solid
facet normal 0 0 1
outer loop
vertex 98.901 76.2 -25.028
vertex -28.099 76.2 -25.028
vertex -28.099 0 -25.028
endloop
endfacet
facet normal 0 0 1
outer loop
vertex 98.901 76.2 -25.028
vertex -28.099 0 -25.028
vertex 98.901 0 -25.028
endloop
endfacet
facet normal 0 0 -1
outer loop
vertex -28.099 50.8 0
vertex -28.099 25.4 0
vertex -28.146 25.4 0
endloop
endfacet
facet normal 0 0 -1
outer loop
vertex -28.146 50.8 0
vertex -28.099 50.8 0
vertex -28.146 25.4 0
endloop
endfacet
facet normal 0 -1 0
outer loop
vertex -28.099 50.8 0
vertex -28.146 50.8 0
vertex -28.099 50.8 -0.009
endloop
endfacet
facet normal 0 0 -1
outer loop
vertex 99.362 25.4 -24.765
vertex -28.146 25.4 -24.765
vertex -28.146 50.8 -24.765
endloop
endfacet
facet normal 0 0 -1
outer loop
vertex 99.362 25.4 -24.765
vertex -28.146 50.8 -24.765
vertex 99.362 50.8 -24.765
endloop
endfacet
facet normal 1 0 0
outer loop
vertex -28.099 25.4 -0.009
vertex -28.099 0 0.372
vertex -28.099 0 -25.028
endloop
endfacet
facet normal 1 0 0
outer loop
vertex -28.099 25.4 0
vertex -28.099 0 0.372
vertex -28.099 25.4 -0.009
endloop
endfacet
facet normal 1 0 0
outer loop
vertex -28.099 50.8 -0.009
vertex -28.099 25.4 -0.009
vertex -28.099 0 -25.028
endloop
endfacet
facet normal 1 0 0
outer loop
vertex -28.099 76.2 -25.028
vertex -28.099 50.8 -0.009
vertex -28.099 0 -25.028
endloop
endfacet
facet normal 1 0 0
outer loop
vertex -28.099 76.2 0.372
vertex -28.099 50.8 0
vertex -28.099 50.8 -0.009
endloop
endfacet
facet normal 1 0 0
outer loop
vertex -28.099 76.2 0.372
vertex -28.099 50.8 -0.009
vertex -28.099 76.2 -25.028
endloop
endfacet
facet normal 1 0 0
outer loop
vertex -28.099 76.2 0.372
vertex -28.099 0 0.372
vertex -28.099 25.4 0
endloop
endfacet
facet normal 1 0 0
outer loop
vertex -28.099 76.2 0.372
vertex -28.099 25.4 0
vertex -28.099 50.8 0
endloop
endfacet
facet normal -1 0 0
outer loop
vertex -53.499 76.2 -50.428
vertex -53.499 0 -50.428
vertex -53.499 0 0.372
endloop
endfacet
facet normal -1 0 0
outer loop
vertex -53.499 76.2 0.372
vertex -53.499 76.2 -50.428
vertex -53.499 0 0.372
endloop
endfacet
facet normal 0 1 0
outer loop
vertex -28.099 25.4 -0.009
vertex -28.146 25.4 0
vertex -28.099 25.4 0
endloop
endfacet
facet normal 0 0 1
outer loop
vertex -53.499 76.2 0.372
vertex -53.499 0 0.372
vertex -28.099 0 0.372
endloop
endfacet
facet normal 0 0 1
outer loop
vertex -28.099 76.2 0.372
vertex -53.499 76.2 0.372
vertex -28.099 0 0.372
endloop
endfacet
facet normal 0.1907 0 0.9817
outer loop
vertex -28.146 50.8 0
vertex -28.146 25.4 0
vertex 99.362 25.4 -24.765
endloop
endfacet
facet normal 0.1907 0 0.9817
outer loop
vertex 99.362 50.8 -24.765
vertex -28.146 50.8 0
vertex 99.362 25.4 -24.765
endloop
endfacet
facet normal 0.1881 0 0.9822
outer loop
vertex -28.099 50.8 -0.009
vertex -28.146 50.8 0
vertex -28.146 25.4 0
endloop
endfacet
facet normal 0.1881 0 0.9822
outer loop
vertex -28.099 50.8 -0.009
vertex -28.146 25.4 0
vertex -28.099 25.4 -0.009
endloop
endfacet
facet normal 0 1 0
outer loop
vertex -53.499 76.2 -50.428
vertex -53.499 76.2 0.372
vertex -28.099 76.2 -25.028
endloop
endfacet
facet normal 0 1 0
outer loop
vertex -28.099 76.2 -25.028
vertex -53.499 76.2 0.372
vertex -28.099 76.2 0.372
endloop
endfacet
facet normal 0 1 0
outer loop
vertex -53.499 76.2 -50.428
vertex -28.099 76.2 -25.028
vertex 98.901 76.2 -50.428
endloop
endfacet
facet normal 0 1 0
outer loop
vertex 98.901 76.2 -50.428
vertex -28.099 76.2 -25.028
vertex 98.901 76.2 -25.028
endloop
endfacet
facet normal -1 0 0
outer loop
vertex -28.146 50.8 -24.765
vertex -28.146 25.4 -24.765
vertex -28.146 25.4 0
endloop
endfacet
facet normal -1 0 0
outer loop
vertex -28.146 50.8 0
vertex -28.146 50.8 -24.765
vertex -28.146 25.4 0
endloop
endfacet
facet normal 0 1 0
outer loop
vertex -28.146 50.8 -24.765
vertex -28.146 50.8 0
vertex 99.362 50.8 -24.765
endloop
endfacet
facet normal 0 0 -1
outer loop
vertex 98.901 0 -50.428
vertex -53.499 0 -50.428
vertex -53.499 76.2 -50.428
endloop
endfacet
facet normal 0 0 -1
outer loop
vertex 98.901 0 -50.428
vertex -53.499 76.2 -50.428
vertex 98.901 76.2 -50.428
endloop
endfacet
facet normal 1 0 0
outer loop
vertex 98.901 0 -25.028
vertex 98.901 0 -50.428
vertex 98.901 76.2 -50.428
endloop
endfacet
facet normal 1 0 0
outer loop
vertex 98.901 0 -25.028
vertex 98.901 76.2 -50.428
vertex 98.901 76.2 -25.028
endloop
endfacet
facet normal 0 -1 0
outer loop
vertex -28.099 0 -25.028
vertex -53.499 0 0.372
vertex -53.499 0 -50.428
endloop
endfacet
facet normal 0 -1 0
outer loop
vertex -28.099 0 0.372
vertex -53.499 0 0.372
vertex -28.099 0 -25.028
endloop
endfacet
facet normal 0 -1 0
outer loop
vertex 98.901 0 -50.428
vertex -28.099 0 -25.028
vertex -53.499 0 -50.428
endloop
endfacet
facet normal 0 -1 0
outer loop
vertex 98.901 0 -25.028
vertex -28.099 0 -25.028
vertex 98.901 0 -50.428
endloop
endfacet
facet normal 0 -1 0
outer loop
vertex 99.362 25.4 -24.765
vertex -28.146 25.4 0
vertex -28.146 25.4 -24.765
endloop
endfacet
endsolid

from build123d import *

# Parameters (mm, degrees)
F0_W     = 152.4
F0_H     = 50.8
F1_DEPTH = 76.2
F2_W     = 127
F2_H     = 76.2
F3_DEPTH = 25.4
F4_W     = 127.508001402
F4_H     = 24.7650016099
F5_DEPTH = 76.2
F6_DEPTH = 25.4
F7_DEPTH = 25.4
F9_DEPTH = 25.4


with BuildPart() as f1:
    # F0 (on Front) → F1 (new body)
    with BuildSketch(Plane.XZ):
        with Locations((22.7011106901, -25.0276401639)):
            Rectangle(F0_W, F0_H)
    extrude(amount=-F1_DEPTH)

    # F2 (on face) → F3 (cut)
    with BuildSketch(Plane.XY.offset(0.3723598361)):
        with Locations((35.4011106901, 38.1)):
            Rectangle(F2_W, F2_H)
    extrude(amount=-F3_DEPTH, mode=Mode.SUBTRACT)


with BuildPart() as f5:
    # F4 (on Front) → F5 (new body)
    with BuildSketch(Plane.XZ):
        with Locations((35.6075530872, -12.382500805)):
            Rectangle(F4_W, F4_H)
    extrude(amount=-F5_DEPTH)

    # F6 (cut): a face of the model
    f6_faces = [f5.faces().sort_by_distance(p)[0] for p in [
        (35.6075530872, 0, -12.382500805),
    ]]
    extrude(f6_faces, amount=-F6_DEPTH, mode=Mode.SUBTRACT)

    # F7 (cut): a face of the model
    f7_faces = [f5.faces().sort_by_distance(p)[0] for p in [
        (35.6075530872, 76.2, -12.382500805),
    ]]
    extrude(f7_faces, amount=-F7_DEPTH, mode=Mode.SUBTRACT)


with BuildPart() as f9_tool:
    # F8 (on face) → F9 (new body)
    with BuildSketch(Plane.XZ.offset(-25.4)):
        Polygon((99.3615537882, 0), (-28.1464476138, 0), (99.3615537882, -24.7650016099), align=None)
    extrude(amount=-F9_DEPTH)


with BuildPart() as f1_1:
    add(f1.part)

    # F9: cut by f9_tool
    add(f9_tool.part, mode=Mode.SUBTRACT)


with BuildPart() as f5_1:
    add(f5.part)

    # F9: cut by f9_tool
    add(f9_tool.part, mode=Mode.SUBTRACT)


solid = Compound([f1_1.part, f5_1.part])
